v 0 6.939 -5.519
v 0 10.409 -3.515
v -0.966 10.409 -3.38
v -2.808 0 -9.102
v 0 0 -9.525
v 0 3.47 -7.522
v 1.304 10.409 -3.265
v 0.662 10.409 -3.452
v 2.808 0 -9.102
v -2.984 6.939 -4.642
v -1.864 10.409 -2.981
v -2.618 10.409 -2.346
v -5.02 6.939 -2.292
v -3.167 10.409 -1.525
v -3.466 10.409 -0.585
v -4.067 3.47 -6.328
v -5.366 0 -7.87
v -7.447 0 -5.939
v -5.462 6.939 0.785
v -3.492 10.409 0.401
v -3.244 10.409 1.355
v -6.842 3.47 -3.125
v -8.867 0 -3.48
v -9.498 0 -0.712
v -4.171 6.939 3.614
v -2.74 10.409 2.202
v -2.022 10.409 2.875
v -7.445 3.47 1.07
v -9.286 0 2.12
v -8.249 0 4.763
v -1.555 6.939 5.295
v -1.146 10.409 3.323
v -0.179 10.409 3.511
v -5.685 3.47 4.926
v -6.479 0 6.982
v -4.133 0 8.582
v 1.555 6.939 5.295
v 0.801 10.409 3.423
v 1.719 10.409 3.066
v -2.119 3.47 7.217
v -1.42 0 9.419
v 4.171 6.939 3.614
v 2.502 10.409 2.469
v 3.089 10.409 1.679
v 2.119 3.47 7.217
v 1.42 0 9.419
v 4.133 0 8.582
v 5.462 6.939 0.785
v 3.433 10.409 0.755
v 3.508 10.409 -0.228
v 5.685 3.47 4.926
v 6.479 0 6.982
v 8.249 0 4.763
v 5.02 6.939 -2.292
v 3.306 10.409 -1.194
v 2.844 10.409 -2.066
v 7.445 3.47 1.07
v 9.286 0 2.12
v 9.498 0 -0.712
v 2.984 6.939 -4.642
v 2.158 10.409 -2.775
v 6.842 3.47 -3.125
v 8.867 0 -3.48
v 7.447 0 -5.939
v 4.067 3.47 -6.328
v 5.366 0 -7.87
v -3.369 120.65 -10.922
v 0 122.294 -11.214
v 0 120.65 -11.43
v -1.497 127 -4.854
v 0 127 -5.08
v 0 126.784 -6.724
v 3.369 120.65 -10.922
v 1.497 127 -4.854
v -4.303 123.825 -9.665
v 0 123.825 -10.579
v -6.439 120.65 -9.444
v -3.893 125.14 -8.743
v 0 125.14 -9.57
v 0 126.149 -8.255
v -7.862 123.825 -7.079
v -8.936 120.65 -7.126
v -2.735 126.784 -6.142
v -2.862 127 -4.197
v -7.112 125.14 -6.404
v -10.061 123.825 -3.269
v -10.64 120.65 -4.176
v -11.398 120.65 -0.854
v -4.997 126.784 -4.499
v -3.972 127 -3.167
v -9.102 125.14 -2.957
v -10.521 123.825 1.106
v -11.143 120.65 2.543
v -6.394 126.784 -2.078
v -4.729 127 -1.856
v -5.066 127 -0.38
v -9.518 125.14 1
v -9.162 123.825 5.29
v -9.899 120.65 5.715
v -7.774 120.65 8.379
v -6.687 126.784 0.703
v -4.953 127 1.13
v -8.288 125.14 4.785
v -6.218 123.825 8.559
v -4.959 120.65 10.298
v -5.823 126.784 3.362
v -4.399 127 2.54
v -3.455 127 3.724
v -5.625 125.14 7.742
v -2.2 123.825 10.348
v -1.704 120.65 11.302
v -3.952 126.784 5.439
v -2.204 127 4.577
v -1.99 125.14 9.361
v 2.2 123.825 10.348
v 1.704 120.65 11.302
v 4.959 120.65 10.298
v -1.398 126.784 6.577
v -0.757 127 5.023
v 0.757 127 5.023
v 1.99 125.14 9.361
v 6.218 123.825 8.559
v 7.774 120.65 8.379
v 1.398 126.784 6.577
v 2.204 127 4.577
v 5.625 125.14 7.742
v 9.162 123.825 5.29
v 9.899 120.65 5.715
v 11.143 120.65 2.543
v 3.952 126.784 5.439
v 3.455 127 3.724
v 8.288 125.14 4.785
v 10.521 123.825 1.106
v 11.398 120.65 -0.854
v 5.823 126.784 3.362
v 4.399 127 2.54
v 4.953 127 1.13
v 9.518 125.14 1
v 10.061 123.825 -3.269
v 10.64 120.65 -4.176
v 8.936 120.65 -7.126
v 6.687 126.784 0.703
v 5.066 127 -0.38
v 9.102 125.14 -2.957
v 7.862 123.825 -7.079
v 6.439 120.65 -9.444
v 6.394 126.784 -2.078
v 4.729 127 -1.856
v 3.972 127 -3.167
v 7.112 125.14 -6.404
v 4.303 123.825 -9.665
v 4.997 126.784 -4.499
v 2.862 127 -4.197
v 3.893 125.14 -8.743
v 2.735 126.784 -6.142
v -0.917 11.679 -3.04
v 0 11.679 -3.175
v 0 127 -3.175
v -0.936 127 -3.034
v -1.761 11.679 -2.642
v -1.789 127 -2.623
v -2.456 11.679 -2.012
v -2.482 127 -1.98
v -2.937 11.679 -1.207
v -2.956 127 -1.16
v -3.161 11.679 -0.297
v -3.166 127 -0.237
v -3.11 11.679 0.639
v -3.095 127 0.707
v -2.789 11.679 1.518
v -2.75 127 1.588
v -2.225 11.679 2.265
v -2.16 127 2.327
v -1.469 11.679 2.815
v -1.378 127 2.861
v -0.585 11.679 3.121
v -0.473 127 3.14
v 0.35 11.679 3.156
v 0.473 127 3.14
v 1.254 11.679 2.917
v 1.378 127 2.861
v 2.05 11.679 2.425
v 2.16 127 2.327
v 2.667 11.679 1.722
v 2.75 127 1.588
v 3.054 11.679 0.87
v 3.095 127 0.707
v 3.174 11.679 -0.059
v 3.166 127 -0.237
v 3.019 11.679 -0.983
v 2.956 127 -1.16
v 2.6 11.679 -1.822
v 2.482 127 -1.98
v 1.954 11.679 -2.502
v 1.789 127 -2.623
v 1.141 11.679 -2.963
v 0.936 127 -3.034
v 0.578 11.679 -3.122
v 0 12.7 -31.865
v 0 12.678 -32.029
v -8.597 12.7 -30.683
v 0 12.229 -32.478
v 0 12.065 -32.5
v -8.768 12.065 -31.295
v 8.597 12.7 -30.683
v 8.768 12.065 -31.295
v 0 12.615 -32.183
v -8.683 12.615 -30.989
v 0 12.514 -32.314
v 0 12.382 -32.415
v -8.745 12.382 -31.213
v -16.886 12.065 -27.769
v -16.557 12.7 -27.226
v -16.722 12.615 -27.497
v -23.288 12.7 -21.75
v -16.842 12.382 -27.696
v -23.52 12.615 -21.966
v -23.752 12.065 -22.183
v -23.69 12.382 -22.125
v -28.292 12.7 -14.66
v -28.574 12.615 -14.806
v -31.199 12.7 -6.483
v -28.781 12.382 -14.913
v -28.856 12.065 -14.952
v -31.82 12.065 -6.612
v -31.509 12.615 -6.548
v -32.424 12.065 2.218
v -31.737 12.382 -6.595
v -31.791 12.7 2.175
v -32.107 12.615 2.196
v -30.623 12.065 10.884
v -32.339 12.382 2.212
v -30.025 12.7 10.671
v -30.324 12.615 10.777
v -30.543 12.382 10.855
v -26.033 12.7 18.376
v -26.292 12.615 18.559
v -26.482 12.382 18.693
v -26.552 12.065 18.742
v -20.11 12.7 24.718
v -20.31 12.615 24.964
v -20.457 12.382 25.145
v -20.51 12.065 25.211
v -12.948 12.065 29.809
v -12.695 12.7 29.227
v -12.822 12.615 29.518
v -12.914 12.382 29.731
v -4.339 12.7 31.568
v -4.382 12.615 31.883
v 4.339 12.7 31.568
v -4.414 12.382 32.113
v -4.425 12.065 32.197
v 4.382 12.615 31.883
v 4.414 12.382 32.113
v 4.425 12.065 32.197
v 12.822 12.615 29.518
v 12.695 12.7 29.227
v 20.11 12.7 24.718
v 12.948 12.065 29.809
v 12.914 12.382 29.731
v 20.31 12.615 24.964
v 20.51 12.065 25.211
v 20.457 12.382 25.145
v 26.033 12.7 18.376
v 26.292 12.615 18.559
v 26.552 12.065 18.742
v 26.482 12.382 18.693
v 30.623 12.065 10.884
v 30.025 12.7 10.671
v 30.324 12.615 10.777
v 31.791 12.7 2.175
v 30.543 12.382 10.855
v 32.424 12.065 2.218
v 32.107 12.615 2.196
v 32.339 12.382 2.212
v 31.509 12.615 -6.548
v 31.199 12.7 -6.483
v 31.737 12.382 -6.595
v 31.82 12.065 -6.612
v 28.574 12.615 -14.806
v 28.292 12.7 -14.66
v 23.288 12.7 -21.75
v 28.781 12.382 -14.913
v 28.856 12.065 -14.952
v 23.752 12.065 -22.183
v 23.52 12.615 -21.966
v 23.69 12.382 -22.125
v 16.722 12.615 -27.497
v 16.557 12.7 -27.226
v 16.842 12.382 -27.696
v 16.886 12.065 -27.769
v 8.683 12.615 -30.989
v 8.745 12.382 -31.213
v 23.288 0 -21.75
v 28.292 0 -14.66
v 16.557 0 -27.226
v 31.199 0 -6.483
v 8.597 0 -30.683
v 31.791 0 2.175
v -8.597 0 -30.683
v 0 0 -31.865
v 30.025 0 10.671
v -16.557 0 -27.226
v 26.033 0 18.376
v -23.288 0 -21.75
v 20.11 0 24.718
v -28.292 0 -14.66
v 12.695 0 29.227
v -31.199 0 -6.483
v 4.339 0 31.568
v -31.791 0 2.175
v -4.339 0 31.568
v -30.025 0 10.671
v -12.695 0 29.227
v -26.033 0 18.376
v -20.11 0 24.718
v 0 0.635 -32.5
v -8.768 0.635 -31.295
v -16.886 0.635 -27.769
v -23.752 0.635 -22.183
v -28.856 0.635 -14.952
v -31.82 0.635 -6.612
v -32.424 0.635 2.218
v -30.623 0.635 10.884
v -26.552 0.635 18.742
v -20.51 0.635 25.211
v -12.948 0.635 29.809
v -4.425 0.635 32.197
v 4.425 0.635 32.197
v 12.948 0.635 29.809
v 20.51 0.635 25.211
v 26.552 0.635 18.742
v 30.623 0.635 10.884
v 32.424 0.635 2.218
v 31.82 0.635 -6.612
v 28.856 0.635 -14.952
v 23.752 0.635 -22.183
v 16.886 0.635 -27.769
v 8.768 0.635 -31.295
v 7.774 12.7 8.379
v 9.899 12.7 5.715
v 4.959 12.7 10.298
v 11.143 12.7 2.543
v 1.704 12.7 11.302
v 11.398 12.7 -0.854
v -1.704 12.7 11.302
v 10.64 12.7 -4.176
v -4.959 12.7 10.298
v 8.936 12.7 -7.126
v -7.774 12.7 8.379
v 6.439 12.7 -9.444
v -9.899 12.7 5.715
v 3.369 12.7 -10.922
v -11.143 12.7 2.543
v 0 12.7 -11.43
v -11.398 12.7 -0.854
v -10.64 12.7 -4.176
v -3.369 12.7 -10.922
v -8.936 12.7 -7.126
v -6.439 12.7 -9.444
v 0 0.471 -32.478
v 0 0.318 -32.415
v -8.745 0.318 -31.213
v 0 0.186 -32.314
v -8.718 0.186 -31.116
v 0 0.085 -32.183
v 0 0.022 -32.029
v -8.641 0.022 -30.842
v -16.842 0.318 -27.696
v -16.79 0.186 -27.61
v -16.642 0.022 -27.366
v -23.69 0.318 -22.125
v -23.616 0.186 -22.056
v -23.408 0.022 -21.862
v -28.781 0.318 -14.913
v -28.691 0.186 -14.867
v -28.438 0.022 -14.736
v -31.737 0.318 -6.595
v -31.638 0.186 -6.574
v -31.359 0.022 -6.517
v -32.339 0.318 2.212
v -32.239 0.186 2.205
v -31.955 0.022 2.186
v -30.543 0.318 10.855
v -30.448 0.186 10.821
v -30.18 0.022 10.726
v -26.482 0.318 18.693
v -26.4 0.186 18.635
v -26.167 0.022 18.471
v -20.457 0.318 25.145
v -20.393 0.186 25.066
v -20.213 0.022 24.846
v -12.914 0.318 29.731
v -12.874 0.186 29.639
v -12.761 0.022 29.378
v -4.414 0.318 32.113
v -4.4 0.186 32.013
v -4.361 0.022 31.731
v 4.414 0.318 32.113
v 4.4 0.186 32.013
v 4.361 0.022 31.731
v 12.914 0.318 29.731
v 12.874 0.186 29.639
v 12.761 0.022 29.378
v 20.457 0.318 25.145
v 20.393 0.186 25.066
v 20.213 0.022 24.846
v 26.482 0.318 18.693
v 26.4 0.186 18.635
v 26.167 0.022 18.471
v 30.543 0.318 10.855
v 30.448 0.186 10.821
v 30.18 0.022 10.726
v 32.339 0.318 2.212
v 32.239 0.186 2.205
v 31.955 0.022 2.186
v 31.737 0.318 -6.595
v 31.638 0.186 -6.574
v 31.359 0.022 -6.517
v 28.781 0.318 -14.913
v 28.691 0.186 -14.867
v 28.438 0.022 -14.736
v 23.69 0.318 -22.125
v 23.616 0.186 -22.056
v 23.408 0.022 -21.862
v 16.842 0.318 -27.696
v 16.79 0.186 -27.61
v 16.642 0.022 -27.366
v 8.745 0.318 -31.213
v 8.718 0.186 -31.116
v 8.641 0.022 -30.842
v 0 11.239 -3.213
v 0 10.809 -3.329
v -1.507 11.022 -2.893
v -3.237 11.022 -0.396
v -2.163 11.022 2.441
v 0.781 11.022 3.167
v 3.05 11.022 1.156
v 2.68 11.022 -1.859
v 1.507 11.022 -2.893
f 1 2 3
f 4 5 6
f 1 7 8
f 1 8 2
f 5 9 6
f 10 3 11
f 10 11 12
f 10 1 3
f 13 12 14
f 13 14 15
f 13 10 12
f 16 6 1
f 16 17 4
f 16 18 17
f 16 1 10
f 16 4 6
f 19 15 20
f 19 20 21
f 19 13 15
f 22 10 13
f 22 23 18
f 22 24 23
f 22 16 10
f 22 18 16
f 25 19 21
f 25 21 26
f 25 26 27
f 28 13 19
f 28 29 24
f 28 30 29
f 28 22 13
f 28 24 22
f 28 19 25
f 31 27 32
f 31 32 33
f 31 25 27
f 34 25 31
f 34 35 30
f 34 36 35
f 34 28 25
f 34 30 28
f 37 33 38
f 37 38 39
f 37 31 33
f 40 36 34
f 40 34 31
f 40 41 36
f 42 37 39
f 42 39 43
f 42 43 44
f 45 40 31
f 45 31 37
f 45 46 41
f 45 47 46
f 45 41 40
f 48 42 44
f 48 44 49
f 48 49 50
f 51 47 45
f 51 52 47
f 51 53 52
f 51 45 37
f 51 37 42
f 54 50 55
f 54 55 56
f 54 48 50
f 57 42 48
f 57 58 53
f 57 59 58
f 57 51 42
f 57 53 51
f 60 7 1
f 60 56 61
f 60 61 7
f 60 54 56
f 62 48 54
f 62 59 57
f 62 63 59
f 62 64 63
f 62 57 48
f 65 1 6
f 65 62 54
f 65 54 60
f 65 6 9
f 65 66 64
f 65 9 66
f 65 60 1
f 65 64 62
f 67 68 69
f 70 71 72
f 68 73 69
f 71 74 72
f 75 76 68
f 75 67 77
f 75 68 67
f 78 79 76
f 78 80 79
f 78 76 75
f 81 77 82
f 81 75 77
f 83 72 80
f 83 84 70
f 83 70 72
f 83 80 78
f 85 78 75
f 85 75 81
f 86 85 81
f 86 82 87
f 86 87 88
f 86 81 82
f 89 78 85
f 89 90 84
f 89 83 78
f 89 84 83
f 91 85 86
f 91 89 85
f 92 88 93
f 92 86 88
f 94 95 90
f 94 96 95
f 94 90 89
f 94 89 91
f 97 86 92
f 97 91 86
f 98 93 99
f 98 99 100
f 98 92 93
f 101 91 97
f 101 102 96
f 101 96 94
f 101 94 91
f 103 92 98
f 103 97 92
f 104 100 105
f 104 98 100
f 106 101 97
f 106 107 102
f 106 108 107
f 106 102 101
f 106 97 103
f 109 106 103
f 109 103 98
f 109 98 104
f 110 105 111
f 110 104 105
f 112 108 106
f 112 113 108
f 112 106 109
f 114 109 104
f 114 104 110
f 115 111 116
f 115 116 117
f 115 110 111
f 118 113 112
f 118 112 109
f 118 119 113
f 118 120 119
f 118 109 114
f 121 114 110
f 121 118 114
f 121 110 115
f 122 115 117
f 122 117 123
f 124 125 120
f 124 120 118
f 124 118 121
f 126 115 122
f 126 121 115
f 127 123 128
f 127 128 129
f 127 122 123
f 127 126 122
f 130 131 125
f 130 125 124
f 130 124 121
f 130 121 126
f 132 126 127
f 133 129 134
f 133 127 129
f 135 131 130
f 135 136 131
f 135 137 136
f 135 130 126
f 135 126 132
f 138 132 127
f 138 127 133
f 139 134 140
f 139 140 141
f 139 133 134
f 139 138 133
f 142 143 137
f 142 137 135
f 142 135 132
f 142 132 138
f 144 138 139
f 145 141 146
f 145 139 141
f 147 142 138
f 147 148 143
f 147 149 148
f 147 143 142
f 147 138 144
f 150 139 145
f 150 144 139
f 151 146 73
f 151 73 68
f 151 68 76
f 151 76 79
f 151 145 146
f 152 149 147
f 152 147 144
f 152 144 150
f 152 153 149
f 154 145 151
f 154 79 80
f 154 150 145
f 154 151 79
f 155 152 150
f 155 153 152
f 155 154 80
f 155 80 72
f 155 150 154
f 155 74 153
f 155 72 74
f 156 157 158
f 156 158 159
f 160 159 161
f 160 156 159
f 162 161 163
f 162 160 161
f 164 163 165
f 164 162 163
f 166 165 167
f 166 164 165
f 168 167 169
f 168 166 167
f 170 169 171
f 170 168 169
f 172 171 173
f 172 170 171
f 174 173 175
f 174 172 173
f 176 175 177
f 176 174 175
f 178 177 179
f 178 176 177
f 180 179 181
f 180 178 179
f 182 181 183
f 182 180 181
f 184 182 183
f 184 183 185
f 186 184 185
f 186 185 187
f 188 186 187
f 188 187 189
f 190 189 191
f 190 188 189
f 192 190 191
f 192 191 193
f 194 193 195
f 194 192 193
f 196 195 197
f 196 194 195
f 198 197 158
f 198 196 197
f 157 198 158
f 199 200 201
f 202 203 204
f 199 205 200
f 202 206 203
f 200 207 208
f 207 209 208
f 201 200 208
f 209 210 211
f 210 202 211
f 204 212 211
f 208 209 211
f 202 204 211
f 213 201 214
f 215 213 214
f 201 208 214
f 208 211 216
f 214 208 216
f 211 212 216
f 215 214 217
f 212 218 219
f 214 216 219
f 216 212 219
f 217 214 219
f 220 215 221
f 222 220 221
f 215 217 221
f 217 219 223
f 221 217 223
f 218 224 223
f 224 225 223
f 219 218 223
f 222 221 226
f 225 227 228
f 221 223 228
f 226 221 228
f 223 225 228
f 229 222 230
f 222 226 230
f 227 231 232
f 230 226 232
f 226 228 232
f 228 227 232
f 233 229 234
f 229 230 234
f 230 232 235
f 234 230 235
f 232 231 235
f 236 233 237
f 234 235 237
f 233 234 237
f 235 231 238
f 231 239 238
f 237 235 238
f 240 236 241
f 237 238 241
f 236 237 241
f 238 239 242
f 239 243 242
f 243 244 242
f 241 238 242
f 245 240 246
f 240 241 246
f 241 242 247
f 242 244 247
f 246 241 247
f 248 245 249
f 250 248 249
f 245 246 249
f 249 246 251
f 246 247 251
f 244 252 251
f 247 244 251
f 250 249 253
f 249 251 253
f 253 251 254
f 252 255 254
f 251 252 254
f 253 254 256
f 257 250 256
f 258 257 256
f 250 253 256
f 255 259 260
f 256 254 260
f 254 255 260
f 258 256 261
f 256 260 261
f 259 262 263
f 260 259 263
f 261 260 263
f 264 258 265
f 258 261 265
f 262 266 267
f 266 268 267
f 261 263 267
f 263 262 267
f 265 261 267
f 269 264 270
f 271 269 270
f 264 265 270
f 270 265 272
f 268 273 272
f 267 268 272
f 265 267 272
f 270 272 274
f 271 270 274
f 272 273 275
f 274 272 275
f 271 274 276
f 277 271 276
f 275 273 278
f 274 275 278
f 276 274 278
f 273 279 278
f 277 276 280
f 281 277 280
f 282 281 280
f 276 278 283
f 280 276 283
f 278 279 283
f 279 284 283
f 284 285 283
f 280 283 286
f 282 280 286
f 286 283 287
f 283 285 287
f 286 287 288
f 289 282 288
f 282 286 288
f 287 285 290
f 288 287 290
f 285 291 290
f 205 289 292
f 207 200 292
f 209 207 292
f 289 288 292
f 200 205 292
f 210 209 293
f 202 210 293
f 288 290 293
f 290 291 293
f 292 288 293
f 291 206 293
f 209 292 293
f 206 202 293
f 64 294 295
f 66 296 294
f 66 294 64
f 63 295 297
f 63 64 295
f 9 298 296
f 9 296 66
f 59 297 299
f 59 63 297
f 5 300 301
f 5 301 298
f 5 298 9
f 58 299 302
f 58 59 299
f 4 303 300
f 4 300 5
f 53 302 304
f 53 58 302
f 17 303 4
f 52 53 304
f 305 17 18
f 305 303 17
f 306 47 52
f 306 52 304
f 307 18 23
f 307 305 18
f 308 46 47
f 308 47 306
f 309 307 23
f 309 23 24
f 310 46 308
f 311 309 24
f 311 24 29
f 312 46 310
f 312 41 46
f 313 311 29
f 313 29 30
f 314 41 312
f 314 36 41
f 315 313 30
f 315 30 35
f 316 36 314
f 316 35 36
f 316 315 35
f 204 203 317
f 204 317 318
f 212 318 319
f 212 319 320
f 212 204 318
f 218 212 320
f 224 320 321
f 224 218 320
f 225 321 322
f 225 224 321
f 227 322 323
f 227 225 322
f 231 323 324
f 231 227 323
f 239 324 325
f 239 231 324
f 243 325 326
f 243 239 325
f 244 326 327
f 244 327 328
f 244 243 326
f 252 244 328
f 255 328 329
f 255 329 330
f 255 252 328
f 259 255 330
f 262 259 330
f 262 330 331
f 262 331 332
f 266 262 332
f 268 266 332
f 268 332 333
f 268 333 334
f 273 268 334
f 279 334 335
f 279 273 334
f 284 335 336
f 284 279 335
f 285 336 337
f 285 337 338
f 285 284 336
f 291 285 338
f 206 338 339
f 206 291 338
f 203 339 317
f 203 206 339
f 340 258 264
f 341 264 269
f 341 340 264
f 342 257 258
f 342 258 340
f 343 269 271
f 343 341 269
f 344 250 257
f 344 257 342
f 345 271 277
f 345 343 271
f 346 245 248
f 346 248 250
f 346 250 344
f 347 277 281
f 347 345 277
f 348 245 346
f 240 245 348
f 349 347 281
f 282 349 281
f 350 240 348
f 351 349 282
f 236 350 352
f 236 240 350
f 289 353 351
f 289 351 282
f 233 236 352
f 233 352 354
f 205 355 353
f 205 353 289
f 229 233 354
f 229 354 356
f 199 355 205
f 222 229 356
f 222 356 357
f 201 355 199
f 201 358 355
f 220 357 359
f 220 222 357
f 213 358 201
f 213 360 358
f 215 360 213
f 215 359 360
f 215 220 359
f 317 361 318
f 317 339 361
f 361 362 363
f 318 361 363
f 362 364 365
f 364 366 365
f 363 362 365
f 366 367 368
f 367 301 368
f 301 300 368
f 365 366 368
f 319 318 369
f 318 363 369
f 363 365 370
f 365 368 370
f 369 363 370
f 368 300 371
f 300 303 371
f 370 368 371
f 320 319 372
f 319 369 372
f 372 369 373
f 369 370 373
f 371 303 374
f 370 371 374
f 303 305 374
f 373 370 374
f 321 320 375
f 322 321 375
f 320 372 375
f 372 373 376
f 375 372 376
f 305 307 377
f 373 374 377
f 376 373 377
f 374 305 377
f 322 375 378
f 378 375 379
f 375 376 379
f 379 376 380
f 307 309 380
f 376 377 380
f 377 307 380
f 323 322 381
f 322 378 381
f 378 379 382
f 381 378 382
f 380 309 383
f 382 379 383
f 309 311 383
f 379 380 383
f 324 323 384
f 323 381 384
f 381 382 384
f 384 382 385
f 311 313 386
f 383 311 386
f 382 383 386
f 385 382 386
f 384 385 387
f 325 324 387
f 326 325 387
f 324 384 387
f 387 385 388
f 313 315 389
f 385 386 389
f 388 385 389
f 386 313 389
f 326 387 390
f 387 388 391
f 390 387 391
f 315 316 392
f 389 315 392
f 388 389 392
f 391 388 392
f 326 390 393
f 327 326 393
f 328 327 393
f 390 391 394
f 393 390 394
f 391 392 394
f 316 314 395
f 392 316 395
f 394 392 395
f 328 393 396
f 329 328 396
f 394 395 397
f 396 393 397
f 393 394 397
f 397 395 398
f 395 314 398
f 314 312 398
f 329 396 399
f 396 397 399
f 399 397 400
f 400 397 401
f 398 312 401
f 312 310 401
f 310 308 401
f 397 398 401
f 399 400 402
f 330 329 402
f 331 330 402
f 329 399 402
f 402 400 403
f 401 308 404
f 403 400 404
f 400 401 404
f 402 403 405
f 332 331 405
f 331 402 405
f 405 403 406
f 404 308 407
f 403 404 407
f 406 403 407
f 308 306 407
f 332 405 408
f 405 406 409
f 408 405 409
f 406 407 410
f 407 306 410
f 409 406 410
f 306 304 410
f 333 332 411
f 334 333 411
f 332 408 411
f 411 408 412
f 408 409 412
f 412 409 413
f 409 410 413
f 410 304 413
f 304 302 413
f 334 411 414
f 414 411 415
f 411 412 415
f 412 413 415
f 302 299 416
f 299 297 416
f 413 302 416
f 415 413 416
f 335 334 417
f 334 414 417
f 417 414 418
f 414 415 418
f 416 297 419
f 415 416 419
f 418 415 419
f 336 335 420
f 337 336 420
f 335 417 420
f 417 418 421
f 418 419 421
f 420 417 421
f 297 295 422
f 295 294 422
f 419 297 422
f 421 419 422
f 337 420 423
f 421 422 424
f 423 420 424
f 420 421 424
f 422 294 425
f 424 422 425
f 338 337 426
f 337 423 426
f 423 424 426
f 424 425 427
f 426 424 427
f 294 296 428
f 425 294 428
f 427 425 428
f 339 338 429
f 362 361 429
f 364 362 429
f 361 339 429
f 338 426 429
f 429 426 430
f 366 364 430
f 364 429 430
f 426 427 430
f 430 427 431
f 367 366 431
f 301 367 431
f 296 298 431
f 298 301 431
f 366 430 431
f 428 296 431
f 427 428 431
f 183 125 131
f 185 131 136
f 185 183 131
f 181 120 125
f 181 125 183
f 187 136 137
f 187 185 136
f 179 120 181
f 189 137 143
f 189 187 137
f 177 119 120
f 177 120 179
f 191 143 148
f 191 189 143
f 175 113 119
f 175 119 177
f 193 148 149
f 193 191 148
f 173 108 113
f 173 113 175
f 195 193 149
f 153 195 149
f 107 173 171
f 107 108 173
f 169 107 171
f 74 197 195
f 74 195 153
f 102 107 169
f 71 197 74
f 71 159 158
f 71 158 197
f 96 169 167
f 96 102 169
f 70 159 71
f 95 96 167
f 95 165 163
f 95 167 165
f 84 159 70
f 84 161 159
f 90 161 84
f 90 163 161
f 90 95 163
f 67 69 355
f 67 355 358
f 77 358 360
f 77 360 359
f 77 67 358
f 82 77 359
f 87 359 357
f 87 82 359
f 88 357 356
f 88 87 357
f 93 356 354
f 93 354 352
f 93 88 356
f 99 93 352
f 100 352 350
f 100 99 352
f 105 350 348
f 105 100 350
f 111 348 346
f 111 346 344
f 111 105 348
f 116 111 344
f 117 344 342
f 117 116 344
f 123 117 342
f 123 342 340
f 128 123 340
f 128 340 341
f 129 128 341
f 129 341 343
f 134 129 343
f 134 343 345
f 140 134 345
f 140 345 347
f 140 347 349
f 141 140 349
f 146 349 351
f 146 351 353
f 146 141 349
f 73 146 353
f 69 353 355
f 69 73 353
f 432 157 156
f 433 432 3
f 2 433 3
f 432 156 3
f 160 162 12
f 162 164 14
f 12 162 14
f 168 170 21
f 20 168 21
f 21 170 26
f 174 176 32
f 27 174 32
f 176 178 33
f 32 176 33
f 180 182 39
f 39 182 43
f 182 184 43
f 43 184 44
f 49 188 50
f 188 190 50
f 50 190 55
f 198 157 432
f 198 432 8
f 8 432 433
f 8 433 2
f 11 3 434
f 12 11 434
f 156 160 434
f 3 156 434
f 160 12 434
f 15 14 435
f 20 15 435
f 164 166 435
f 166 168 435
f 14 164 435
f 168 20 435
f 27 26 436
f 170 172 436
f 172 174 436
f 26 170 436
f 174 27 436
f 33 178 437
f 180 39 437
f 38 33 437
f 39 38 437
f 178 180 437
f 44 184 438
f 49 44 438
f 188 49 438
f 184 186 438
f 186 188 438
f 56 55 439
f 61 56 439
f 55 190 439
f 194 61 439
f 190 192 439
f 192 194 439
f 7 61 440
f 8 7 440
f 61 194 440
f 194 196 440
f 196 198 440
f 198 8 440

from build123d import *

# Parameters (mm, degrees)
FILLET1_R = 6.35
FILLET2_R = 0.635
FILLET3_R = 2.54


with BuildPart() as part:
    # Sketch3 → Revolve1 (revolve)
    with BuildSketch(Plane.XY, mode=Mode.PRIVATE) as revolve1_sk:
        Polygon((3.175, 127), (3.175, 10.998522628), (9.525, 0), (32.500000024, 0), (32.500000024, 12.7), (11.43, 12.7), (11.43, 127), align=None)
    revolve(revolve1_sk.sketch.rotate(Axis((0, 0, 0), (0, 1, 0)), 90), axis=Axis((0, 0, 0), (0, 1, 0)))

    # Fillet1
    fillet1_edges = [part.edges().sort_by_distance(p)[0] for p in [
        (0, 127, 11.43),
    ]]
    fillet(fillet1_edges, radius=FILLET1_R)

    # Fillet2
    fillet2_edges = [part.edges().sort_by_distance(p)[0] for p in [
        (0, 12.7, 32.500000024),
        (0, 0, 32.500000024),
    ]]
    fillet(fillet2_edges, radius=FILLET2_R)

    # Fillet3
    fillet3_edges = [part.edges().sort_by_distance(p)[0] for p in [
        (0, 10.998522628, 3.175),
    ]]
    fillet(fillet3_edges, radius=FILLET3_R)


solid = part.part
